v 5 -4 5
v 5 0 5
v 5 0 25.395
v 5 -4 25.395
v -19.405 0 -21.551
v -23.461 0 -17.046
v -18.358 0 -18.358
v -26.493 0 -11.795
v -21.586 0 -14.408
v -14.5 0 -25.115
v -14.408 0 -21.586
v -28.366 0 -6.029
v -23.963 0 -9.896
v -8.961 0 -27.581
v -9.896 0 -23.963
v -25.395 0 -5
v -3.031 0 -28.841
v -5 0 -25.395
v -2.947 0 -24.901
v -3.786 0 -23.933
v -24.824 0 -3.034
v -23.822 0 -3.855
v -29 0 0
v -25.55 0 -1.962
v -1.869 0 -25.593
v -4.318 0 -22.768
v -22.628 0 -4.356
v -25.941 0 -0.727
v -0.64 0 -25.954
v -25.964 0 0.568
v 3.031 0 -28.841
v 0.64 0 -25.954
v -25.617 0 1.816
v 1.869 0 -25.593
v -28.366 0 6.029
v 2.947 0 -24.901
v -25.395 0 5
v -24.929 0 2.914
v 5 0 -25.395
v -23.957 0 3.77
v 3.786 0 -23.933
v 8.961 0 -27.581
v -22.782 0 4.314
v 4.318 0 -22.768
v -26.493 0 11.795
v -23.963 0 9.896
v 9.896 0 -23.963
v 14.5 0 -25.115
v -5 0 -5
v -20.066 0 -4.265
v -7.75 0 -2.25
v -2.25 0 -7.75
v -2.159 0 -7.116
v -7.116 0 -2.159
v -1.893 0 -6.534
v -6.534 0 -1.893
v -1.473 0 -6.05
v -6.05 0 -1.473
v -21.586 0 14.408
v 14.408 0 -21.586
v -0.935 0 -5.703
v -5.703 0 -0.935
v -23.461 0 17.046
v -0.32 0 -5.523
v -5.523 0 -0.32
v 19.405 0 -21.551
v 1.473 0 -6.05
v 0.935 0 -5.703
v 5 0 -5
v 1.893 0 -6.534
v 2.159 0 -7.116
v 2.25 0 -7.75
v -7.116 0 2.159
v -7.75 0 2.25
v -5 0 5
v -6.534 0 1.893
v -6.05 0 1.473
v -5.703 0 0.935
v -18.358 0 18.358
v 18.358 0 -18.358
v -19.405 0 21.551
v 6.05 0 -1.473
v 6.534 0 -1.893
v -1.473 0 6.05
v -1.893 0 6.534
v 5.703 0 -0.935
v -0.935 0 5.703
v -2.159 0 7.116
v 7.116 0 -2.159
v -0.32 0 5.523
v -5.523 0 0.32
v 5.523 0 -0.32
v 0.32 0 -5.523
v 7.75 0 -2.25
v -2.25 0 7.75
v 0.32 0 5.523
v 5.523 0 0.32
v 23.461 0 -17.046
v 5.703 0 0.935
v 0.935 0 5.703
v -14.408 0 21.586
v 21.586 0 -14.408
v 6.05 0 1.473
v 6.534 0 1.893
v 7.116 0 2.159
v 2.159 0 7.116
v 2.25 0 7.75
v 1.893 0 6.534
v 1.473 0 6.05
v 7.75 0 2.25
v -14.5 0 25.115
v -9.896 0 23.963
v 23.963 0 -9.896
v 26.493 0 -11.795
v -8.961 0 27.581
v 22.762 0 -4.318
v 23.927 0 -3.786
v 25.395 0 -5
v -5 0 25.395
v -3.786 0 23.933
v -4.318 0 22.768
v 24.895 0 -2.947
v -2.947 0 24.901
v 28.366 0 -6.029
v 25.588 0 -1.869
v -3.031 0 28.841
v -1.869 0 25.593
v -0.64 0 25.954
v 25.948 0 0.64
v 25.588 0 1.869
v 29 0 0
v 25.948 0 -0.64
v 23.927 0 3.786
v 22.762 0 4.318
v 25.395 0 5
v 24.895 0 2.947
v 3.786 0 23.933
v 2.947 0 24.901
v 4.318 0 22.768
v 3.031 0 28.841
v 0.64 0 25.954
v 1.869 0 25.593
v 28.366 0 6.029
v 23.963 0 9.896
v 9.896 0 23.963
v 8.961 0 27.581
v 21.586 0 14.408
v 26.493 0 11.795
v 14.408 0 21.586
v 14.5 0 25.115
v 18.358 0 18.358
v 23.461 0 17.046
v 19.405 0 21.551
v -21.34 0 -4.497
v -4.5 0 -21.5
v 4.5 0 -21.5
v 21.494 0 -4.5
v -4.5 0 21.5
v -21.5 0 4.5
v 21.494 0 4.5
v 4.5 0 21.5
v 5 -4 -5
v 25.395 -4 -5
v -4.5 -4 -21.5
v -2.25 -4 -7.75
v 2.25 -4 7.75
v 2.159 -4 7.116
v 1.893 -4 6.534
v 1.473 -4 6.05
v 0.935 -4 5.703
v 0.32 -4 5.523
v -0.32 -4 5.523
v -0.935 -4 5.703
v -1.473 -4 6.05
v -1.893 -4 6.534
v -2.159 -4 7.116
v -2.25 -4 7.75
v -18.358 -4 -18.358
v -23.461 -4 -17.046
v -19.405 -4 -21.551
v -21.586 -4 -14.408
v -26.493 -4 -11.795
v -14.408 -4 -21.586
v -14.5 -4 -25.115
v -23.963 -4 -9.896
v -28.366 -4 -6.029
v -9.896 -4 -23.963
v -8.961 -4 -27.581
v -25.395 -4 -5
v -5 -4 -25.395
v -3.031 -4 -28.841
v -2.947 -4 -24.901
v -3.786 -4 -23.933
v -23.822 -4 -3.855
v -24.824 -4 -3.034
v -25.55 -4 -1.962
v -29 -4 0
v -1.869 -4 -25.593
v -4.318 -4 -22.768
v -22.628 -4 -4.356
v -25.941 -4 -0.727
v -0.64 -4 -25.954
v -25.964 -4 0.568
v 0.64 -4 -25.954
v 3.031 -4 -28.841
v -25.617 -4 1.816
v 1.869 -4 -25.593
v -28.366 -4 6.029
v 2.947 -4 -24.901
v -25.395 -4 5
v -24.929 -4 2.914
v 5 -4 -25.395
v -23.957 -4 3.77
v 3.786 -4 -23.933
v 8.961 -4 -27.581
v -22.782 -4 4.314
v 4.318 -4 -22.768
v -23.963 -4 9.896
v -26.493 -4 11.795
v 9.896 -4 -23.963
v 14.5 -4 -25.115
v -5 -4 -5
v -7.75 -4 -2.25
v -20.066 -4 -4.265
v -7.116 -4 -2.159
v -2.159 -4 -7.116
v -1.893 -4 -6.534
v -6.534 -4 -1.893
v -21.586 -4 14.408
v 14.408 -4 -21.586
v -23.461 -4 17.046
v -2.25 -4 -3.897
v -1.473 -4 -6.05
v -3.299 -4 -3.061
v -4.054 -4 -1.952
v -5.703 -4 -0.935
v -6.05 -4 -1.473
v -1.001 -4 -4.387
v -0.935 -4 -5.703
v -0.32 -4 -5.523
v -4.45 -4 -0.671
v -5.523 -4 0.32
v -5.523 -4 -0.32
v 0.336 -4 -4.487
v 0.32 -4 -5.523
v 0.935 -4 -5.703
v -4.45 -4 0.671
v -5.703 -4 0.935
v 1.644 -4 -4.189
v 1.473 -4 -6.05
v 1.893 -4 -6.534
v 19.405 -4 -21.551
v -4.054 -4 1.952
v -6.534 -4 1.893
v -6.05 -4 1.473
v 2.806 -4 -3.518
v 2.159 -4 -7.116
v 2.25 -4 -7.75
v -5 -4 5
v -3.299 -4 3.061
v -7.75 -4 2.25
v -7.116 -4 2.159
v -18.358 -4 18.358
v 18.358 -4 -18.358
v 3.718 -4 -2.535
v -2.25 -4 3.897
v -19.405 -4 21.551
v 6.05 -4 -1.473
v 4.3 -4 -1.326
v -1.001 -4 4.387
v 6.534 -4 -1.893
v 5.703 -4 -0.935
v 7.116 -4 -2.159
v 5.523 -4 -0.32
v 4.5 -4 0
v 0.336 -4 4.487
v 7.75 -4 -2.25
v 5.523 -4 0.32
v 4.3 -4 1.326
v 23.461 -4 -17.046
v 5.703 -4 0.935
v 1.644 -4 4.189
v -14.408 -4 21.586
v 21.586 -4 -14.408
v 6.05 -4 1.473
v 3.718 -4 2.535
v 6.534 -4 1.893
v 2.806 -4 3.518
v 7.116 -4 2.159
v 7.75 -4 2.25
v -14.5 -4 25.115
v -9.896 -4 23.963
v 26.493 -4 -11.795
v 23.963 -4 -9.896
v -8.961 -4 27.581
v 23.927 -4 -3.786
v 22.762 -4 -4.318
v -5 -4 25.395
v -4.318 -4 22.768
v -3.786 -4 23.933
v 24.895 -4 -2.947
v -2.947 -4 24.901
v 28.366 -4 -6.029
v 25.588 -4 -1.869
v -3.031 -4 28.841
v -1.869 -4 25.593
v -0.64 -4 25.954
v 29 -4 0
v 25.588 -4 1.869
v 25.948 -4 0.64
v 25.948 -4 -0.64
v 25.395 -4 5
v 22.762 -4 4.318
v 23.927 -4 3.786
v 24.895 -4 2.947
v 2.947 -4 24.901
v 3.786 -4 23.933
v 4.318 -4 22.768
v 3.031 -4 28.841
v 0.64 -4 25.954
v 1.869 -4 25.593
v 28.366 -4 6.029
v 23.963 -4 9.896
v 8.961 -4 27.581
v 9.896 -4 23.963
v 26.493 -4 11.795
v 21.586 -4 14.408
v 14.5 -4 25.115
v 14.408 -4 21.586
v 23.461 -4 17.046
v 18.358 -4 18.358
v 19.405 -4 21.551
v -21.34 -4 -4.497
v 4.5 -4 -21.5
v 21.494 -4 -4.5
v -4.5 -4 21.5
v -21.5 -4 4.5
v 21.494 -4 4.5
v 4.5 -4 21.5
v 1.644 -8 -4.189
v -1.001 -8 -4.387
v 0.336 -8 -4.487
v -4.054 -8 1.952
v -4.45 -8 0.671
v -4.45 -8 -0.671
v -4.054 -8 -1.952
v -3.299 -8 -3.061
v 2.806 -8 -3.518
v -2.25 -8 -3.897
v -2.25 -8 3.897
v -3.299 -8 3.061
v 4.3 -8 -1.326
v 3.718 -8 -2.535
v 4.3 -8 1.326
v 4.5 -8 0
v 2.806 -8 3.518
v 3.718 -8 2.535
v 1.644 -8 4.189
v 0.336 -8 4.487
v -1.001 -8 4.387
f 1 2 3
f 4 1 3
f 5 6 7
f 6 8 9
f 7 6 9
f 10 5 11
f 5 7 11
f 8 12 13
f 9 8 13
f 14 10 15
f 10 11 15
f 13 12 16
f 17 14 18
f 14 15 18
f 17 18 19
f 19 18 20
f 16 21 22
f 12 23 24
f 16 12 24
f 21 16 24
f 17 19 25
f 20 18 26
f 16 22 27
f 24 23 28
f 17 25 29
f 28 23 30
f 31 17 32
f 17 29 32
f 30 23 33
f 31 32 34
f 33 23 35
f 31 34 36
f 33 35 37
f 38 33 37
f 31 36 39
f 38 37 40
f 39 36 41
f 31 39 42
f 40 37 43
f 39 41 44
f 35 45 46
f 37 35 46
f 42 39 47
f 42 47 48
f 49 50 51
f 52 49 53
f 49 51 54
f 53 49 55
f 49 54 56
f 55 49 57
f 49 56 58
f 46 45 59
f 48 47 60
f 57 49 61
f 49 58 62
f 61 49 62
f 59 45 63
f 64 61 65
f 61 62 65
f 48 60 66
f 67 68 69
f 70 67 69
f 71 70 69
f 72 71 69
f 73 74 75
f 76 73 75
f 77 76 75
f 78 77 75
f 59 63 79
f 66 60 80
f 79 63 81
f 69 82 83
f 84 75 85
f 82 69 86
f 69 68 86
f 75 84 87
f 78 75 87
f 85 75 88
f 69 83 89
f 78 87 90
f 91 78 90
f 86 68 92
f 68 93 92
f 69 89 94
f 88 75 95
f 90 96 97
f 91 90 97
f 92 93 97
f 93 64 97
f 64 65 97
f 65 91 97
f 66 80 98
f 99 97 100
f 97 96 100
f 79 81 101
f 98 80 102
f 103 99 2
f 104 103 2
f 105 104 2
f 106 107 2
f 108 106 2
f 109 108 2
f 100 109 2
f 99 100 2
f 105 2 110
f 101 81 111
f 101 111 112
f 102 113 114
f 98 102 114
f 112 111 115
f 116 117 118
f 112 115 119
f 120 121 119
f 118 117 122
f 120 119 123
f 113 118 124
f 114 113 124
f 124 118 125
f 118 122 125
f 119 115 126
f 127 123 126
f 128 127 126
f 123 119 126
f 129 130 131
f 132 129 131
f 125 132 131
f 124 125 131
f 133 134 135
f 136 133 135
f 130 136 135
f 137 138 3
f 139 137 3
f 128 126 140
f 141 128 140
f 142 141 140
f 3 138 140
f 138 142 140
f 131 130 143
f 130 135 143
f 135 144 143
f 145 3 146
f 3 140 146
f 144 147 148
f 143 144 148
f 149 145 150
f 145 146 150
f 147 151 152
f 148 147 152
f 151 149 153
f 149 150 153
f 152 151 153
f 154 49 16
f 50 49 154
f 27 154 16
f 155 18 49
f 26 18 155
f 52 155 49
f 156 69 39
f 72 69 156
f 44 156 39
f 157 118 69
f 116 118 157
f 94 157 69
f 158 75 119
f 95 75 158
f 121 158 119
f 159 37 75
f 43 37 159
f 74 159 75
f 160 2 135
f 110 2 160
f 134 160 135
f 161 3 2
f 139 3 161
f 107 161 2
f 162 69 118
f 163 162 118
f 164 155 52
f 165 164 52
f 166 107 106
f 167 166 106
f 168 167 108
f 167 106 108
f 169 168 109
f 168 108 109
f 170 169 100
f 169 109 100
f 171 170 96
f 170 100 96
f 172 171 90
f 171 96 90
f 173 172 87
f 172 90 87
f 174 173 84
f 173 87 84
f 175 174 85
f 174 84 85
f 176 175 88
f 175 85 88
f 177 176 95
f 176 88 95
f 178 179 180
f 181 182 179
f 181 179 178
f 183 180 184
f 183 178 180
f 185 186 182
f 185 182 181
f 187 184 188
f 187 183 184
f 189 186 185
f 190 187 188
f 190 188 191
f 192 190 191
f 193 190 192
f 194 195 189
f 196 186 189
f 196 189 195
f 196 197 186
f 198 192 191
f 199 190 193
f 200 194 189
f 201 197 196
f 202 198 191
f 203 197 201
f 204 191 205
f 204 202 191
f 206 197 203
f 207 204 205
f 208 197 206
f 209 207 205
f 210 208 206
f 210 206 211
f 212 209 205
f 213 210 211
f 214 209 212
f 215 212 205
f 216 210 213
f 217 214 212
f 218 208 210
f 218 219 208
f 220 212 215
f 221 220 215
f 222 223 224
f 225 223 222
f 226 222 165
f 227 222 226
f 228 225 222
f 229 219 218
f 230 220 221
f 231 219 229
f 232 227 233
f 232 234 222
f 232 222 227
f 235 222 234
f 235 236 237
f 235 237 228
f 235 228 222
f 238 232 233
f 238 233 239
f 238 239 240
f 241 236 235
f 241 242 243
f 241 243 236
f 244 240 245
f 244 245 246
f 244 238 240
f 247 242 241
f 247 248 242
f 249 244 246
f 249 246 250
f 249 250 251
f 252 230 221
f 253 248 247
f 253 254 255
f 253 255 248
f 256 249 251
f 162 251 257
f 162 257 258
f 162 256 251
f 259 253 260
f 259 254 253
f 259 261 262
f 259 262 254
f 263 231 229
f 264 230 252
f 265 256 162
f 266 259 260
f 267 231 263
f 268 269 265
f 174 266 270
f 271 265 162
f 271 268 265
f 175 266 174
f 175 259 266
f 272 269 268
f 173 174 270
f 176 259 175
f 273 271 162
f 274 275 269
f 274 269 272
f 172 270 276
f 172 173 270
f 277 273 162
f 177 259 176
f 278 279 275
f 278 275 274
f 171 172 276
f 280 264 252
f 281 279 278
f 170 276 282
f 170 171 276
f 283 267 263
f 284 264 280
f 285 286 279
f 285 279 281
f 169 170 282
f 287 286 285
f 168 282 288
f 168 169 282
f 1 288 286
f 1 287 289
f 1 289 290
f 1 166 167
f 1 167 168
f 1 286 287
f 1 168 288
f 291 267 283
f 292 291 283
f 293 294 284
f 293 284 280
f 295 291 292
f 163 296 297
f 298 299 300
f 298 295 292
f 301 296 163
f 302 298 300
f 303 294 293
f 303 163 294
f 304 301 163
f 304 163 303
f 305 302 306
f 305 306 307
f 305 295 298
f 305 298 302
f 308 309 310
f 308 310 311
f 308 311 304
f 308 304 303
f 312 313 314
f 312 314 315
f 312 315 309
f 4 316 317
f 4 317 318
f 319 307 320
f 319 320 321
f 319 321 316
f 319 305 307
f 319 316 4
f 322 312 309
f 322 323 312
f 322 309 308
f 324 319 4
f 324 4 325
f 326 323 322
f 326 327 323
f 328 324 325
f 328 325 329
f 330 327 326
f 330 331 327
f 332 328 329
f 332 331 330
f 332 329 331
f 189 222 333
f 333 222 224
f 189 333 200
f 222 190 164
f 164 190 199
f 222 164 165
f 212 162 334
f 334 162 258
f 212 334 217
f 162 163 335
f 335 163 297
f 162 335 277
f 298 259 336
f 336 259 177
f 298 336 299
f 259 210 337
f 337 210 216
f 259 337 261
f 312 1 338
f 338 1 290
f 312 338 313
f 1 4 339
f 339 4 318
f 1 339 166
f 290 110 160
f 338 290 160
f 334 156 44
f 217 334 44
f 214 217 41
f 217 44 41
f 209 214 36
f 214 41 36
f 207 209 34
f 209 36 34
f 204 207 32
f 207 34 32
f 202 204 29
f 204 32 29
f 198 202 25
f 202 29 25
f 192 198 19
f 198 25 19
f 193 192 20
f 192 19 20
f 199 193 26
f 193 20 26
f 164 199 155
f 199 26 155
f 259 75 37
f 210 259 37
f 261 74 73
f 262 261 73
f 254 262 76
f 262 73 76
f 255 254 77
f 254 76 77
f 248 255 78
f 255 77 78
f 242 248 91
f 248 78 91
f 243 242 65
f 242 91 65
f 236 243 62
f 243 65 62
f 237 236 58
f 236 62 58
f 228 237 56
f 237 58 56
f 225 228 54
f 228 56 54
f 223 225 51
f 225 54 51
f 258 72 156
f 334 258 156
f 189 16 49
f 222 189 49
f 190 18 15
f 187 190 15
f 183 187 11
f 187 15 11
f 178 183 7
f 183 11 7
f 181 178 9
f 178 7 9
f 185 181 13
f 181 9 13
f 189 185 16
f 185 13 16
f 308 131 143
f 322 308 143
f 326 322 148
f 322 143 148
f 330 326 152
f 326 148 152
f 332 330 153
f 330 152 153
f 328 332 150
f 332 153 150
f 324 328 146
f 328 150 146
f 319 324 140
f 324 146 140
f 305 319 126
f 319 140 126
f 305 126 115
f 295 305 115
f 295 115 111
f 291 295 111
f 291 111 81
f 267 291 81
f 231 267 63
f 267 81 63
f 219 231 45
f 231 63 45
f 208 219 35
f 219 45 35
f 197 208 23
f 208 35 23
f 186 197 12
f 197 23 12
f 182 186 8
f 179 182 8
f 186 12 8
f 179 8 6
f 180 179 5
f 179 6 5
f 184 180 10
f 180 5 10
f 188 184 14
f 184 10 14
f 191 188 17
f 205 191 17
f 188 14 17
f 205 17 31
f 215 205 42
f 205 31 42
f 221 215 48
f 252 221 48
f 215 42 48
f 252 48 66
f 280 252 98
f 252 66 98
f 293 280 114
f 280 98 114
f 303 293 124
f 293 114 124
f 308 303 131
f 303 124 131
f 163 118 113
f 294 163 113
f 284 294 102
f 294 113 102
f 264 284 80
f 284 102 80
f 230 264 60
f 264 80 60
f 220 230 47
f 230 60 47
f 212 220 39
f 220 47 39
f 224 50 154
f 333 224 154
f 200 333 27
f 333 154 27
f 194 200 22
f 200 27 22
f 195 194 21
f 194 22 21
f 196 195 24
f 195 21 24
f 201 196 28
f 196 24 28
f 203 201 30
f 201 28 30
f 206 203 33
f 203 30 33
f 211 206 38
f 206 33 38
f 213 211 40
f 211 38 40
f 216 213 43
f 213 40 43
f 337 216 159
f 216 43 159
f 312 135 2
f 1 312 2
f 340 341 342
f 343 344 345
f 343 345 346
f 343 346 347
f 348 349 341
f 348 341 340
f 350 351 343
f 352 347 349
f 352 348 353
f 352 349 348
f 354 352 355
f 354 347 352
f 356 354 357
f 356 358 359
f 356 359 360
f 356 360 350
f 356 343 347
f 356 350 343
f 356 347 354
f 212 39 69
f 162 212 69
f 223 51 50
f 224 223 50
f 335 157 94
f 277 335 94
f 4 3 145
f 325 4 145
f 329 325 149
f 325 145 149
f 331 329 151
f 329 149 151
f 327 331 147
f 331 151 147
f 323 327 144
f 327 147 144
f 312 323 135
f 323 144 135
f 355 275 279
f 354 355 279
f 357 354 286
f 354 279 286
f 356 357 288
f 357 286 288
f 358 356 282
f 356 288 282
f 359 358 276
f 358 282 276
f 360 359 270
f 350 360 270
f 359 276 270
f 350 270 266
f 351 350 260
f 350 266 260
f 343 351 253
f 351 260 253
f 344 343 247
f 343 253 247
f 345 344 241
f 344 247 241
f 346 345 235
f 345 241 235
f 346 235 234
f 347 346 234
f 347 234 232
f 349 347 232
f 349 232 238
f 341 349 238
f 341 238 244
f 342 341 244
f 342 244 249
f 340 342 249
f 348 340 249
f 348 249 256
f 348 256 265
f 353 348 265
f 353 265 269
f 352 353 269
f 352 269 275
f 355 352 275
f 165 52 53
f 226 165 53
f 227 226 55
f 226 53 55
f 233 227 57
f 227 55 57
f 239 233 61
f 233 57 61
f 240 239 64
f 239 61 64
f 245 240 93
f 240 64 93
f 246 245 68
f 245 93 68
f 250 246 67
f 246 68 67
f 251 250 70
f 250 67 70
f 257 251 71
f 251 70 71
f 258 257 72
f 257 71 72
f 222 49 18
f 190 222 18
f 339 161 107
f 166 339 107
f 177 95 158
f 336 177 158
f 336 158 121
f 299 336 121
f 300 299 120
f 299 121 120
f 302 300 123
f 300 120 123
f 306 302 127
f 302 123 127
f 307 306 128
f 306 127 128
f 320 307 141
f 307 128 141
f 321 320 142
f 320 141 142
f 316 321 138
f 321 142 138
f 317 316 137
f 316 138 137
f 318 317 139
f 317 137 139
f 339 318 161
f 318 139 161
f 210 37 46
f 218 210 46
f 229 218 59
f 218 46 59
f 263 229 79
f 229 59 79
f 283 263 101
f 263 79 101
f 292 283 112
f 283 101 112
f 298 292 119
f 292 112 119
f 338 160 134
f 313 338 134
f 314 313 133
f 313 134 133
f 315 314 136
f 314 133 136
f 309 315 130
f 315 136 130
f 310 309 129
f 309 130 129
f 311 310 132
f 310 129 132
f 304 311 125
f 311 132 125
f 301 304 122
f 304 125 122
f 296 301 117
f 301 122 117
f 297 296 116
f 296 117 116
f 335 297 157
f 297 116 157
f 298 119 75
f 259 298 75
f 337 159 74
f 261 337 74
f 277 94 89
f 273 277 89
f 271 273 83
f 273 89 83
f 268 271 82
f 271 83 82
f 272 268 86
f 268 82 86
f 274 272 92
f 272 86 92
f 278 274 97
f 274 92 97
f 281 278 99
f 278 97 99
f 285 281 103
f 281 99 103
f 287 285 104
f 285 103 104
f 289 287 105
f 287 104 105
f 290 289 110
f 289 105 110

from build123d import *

# Parameters (mm, degrees)
F0_R     = 4.5
F1_DEPTH = 8
F0_R_2   = 29
F0_R_3   = 27
F2_DEPTH = 4


with BuildPart() as f1:
    # F0 (on Front) → F1 (new body)
    with BuildSketch(Plane.XZ):
        Circle(F0_R)
    extrude(amount=F1_DEPTH)

    # F0 (on Front) → F2 (join)
    with BuildSketch(Plane.XZ):
        Circle(F0_R_2)
        Circle(F0_R_3, mode=Mode.SUBTRACT)
        Circle(F0_R_3)
        with BuildLine():
            Line((-25.3947422835, -5), (-5, -5))
            Line((-5, -5), (-5, -25.3947395831))
            ThreePointArc((-5, -25.3947395831), (-18.3578630178, -18.3578620861), (-25.3947422835, -5))
        make_face(mode=Mode.SUBTRACT)
        with BuildLine():
            ThreePointArc((4.5, -21.5), (0, -26), (-4.5, -21.5))
            Line((-4.5, -21.5), (-2.25, -7.75))
            ThreePointArc((-2.25, -7.75), (0, -5.5), (2.25, -7.75))
            Line((2.25, -7.75), (4.5, -21.5))
        make_face(mode=Mode.SUBTRACT)
        with BuildLine():
            Line((5, -25.3947395831), (5, -5))
            Line((5, -5), (25.3947422835, -5))
            ThreePointArc((25.3947422835, -5), (18.3578630178, -18.3578620861), (5, -25.3947395831))
        make_face(mode=Mode.SUBTRACT)
        with BuildLine():
            ThreePointArc((-20.0656793303, -4.2652929813), (-25.940935623, -0.7266985565), (-21.5, 4.5))
            Line((-21.5, 4.5), (-7.75, 2.25))
            ThreePointArc((-7.75, 2.25), (-5.5, 0), (-7.75, -2.25))
            Line((-7.75, -2.25), (-20.0656793303, -4.2652929813))
        make_face(mode=Mode.SUBTRACT)
        with BuildLine():
            Line((-5, 25.3947422835), (-5, 5))
            Line((-5, 5), (-25.3947422835, 5))
            ThreePointArc((-25.3947422835, 5), (-18.35786369, 18.35786369), (-5, 25.3947422835))
        make_face(mode=Mode.SUBTRACT)
        Circle(F0_R, mode=Mode.SUBTRACT)
        with BuildLine():
            ThreePointArc((7.75, -2.25), (5.5, 0), (7.75, 2.25))
            Line((7.75, 2.25), (21.4941852602, 4.5))
            ThreePointArc((21.4941852602, 4.5), (25.9941852602, 0), (21.4941852602, -4.5))
            Line((21.4941852602, -4.5), (7.75, -2.25))
        make_face(mode=Mode.SUBTRACT)
        with BuildLine():
            ThreePointArc((-4.5, 21.5), (0, 26), (4.5, 21.5))
            Line((4.5, 21.5), (2.25, 7.75))
            ThreePointArc((2.25, 7.75), (0, 5.5), (-2.25, 7.75))
            Line((-2.25, 7.75), (-4.5, 21.5))
        make_face(mode=Mode.SUBTRACT)
        with BuildLine():
            Line((25.3947422835, 5), (5, 5))
            Line((5, 5), (5, 25.3947422835))
            ThreePointArc((5, 25.3947422835), (18.35786369, 18.35786369), (25.3947422835, 5))
        make_face(mode=Mode.SUBTRACT)
    extrude(amount=F2_DEPTH)


solid = f1.part
